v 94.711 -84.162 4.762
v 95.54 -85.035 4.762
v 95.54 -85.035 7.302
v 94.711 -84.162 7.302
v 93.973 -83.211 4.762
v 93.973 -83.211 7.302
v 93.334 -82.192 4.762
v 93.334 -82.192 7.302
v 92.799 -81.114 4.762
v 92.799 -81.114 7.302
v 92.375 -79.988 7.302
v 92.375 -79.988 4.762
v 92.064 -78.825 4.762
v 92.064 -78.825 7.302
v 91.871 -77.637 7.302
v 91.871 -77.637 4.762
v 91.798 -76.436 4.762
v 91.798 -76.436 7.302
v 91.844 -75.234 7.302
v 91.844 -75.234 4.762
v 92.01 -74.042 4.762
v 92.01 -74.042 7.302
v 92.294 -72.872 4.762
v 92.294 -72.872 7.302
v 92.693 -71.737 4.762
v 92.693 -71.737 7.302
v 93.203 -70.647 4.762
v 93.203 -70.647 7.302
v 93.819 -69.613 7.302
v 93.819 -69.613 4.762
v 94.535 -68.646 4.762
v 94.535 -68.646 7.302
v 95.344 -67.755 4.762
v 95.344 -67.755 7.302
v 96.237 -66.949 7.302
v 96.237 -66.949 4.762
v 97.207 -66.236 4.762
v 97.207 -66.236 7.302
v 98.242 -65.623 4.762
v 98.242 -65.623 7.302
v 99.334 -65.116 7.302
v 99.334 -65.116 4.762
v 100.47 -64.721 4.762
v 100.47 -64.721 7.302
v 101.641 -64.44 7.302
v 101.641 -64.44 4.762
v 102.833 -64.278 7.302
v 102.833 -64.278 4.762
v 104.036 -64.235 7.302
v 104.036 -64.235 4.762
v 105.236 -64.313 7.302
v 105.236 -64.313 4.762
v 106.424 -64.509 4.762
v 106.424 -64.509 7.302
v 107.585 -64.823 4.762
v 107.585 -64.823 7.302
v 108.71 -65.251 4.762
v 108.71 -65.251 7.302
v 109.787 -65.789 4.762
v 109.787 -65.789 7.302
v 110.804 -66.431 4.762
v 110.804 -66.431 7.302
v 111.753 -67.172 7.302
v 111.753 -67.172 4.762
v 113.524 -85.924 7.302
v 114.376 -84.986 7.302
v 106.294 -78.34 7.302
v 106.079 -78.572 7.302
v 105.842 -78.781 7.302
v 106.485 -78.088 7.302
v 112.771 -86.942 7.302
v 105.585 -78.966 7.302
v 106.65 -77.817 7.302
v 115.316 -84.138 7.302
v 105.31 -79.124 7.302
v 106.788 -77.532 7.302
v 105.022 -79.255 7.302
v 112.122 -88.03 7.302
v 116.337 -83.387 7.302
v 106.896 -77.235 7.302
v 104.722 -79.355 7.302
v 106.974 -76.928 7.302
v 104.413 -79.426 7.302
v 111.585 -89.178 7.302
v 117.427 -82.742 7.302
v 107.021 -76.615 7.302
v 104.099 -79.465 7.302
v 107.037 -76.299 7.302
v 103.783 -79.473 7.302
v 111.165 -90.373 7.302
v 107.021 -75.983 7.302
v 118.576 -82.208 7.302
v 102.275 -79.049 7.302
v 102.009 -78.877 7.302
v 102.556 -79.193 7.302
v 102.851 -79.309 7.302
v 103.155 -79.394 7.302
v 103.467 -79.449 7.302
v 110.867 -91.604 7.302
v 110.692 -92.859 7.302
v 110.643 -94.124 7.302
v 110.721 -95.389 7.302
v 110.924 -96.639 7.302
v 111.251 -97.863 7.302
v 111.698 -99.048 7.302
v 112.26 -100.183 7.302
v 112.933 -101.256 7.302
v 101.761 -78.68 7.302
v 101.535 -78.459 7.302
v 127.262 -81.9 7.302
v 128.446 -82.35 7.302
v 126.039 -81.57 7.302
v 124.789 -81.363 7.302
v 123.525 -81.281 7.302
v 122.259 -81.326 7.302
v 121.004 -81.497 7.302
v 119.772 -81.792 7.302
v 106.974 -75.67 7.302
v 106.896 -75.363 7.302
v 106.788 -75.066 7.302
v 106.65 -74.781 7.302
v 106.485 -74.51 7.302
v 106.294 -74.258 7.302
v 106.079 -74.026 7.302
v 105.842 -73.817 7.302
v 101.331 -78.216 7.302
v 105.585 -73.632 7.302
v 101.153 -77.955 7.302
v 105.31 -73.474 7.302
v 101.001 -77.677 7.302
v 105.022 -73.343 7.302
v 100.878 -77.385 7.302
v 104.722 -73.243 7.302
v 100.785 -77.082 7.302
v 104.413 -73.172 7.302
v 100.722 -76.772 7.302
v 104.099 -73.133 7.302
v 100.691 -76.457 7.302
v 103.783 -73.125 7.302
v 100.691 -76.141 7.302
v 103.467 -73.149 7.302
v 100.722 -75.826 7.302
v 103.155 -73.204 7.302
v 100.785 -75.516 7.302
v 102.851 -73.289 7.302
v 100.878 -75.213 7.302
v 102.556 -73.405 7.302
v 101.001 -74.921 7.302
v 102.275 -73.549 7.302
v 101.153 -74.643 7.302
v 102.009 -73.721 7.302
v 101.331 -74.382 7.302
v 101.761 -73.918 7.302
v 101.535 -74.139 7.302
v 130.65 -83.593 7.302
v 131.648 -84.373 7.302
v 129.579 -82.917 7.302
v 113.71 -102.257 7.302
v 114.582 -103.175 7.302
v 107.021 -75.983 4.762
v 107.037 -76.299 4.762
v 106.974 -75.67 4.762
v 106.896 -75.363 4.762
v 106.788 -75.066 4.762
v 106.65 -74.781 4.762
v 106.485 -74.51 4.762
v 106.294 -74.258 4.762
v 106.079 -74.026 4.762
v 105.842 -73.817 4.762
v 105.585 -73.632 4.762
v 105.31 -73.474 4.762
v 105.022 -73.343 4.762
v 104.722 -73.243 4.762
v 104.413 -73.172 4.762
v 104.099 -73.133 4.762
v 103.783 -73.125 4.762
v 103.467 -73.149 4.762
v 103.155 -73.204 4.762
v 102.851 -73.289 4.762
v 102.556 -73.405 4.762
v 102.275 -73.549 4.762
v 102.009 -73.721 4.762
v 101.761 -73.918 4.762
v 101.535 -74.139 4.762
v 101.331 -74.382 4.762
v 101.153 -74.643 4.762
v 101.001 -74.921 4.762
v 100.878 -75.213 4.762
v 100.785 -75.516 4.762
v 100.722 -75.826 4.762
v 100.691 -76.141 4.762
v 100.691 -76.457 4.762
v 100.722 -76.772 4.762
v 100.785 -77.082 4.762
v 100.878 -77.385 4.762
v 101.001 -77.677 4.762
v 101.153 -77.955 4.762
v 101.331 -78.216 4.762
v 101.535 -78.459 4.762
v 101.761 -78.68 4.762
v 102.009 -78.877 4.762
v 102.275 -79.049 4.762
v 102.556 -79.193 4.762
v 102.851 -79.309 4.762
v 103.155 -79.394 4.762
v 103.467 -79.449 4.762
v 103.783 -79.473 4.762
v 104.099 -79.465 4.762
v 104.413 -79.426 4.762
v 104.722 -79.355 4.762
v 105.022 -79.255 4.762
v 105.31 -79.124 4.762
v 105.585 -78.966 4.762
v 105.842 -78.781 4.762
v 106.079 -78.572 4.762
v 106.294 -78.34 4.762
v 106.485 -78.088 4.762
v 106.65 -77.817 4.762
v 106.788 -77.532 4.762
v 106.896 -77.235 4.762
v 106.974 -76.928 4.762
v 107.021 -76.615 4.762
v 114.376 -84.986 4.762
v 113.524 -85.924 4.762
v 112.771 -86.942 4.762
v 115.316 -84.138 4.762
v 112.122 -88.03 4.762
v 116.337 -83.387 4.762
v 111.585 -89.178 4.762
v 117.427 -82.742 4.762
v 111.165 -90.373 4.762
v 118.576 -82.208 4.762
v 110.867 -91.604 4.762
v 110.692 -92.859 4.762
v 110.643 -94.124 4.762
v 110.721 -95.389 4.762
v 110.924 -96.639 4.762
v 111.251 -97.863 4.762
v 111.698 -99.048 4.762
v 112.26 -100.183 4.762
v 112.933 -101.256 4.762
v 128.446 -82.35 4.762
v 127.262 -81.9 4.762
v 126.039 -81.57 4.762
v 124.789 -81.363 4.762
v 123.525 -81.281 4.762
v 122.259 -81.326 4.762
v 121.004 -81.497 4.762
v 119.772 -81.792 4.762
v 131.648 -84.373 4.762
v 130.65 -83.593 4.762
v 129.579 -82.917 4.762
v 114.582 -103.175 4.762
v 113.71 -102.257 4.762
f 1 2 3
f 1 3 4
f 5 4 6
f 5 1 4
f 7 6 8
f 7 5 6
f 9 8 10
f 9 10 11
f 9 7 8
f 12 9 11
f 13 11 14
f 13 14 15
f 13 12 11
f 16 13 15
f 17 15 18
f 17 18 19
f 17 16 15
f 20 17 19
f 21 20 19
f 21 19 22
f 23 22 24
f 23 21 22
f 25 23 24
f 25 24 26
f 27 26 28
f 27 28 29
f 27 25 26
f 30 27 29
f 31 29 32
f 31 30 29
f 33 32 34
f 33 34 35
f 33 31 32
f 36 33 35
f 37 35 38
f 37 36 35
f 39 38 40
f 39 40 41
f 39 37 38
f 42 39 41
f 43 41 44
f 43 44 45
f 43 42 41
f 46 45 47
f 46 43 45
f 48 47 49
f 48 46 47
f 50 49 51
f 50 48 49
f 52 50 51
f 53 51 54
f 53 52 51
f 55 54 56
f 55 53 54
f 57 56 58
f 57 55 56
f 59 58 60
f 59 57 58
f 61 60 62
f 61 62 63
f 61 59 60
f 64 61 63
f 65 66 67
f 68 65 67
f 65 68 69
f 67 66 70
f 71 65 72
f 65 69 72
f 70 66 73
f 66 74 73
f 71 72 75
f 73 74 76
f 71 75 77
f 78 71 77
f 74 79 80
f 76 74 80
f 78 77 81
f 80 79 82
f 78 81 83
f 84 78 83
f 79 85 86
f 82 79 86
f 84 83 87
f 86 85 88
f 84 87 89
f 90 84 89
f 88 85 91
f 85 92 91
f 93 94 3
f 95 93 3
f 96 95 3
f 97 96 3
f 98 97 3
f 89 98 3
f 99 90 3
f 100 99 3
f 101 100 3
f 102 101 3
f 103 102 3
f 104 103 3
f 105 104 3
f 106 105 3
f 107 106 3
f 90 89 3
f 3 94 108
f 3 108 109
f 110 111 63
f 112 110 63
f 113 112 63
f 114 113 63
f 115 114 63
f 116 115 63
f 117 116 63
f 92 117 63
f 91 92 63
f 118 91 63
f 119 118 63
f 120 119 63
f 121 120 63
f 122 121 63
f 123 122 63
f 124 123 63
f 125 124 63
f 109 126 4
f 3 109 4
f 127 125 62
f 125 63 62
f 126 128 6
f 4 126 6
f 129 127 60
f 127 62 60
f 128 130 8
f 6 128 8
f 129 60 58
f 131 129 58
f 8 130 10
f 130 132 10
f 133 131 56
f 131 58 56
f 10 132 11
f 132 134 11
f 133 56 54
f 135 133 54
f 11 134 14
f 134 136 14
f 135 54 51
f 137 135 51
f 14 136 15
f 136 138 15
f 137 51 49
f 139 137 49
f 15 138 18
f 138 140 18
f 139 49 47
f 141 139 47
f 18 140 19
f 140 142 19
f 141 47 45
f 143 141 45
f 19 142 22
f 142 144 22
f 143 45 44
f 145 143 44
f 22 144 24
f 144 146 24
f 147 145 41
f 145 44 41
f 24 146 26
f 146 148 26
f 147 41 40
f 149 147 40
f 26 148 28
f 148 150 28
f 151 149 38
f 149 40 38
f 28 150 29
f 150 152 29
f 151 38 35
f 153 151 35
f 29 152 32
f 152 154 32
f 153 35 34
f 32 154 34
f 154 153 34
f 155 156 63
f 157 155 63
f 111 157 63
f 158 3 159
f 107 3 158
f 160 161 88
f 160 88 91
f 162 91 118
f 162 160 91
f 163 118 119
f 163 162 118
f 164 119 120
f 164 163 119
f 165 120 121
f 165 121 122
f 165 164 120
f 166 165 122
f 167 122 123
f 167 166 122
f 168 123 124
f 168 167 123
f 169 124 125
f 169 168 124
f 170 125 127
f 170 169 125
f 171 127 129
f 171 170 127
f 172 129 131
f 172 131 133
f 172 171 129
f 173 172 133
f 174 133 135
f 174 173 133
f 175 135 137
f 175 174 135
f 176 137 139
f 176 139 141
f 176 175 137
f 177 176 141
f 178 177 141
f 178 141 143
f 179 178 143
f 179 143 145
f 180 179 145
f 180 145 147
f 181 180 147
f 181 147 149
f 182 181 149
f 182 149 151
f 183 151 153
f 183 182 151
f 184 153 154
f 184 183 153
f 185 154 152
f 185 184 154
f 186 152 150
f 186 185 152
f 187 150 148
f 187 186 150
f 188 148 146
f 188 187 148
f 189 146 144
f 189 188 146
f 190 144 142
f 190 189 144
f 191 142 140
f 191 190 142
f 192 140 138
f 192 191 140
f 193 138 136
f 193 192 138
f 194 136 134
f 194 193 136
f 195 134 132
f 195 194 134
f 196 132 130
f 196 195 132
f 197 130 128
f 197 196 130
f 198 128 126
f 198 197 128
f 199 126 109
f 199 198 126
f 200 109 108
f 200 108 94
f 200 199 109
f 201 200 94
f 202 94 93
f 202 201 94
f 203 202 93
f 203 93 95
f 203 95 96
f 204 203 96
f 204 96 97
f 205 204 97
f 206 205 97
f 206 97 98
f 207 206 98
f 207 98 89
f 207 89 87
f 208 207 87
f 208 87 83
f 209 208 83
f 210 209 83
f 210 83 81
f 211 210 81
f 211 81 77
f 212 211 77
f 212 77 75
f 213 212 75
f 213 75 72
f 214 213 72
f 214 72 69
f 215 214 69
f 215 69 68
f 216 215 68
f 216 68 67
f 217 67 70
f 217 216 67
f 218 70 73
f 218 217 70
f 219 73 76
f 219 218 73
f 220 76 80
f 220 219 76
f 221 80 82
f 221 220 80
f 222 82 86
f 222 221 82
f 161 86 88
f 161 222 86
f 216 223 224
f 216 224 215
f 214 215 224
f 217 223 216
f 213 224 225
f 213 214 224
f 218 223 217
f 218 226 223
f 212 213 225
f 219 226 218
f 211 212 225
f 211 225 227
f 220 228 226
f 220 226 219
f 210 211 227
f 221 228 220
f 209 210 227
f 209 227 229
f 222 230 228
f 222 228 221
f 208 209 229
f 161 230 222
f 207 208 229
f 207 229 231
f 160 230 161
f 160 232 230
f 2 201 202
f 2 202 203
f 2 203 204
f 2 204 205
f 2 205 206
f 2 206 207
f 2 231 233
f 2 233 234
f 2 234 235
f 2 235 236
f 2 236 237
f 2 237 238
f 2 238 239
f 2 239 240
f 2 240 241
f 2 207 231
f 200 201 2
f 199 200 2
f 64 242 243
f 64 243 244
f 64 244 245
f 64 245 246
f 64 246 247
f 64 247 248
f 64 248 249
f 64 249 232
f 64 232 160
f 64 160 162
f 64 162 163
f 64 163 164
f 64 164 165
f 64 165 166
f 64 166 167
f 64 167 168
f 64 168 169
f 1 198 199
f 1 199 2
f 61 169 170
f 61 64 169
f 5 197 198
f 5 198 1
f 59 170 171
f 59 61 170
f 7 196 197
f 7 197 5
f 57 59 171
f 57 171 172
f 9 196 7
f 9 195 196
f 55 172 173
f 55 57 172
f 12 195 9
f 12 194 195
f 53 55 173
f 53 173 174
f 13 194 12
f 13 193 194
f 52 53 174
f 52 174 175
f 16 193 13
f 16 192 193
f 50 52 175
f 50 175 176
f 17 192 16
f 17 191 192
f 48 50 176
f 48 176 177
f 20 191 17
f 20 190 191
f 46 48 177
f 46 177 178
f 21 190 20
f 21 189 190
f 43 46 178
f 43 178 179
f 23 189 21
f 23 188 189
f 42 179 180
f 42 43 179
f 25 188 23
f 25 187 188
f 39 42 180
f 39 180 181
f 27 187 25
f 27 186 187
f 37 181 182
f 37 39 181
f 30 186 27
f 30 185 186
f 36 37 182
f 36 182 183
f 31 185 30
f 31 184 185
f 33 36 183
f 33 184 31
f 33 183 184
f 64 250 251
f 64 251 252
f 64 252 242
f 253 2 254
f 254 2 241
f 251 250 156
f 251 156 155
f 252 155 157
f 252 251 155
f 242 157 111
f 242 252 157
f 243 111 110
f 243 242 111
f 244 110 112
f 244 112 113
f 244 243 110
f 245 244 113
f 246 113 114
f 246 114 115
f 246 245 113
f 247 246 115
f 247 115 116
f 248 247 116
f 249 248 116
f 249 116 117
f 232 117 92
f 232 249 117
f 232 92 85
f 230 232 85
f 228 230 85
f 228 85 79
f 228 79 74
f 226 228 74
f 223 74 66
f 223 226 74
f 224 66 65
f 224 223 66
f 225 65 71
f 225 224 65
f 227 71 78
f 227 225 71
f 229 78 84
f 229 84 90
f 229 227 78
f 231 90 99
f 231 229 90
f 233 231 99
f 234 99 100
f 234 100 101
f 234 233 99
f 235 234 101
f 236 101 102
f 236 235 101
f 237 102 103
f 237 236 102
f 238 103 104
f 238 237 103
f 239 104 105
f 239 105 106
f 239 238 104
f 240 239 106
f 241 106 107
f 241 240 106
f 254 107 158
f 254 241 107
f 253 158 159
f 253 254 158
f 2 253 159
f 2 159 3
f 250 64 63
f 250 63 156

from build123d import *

# Parameters (mm, degrees)
BOSS_EXTRUDE3_START = 4.7625
SKETCH2_R           = 3.175
BOSS_EXTRUDE3_DEPTH = 2.54


with BuildPart() as part:
    # Sketch2 → Boss-Extrude3 (new body)
    with BuildSketch(Plane.XY.offset(BOSS_EXTRUDE3_START)):
        with BuildLine():
            Line((111.752654756, -67.172007853), (131.648348491, -84.372647625))
            ThreePointArc((131.648348491, -84.372647625), (113.938329585, -85.444576189), (114.582474398, -103.175308774))
            Line((114.582474398, -103.175308774), (95.540074367, -85.034535944))
            ThreePointArc((95.540074367, -85.034535944), (94.928136795, -68.190339989), (111.752654756, -67.172007853))
        make_face()
        with Locations((103.862003689, -76.298992609)):
            Circle(SKETCH2_R, mode=Mode.SUBTRACT)
    extrude(amount=BOSS_EXTRUDE3_DEPTH)


solid = part.part
